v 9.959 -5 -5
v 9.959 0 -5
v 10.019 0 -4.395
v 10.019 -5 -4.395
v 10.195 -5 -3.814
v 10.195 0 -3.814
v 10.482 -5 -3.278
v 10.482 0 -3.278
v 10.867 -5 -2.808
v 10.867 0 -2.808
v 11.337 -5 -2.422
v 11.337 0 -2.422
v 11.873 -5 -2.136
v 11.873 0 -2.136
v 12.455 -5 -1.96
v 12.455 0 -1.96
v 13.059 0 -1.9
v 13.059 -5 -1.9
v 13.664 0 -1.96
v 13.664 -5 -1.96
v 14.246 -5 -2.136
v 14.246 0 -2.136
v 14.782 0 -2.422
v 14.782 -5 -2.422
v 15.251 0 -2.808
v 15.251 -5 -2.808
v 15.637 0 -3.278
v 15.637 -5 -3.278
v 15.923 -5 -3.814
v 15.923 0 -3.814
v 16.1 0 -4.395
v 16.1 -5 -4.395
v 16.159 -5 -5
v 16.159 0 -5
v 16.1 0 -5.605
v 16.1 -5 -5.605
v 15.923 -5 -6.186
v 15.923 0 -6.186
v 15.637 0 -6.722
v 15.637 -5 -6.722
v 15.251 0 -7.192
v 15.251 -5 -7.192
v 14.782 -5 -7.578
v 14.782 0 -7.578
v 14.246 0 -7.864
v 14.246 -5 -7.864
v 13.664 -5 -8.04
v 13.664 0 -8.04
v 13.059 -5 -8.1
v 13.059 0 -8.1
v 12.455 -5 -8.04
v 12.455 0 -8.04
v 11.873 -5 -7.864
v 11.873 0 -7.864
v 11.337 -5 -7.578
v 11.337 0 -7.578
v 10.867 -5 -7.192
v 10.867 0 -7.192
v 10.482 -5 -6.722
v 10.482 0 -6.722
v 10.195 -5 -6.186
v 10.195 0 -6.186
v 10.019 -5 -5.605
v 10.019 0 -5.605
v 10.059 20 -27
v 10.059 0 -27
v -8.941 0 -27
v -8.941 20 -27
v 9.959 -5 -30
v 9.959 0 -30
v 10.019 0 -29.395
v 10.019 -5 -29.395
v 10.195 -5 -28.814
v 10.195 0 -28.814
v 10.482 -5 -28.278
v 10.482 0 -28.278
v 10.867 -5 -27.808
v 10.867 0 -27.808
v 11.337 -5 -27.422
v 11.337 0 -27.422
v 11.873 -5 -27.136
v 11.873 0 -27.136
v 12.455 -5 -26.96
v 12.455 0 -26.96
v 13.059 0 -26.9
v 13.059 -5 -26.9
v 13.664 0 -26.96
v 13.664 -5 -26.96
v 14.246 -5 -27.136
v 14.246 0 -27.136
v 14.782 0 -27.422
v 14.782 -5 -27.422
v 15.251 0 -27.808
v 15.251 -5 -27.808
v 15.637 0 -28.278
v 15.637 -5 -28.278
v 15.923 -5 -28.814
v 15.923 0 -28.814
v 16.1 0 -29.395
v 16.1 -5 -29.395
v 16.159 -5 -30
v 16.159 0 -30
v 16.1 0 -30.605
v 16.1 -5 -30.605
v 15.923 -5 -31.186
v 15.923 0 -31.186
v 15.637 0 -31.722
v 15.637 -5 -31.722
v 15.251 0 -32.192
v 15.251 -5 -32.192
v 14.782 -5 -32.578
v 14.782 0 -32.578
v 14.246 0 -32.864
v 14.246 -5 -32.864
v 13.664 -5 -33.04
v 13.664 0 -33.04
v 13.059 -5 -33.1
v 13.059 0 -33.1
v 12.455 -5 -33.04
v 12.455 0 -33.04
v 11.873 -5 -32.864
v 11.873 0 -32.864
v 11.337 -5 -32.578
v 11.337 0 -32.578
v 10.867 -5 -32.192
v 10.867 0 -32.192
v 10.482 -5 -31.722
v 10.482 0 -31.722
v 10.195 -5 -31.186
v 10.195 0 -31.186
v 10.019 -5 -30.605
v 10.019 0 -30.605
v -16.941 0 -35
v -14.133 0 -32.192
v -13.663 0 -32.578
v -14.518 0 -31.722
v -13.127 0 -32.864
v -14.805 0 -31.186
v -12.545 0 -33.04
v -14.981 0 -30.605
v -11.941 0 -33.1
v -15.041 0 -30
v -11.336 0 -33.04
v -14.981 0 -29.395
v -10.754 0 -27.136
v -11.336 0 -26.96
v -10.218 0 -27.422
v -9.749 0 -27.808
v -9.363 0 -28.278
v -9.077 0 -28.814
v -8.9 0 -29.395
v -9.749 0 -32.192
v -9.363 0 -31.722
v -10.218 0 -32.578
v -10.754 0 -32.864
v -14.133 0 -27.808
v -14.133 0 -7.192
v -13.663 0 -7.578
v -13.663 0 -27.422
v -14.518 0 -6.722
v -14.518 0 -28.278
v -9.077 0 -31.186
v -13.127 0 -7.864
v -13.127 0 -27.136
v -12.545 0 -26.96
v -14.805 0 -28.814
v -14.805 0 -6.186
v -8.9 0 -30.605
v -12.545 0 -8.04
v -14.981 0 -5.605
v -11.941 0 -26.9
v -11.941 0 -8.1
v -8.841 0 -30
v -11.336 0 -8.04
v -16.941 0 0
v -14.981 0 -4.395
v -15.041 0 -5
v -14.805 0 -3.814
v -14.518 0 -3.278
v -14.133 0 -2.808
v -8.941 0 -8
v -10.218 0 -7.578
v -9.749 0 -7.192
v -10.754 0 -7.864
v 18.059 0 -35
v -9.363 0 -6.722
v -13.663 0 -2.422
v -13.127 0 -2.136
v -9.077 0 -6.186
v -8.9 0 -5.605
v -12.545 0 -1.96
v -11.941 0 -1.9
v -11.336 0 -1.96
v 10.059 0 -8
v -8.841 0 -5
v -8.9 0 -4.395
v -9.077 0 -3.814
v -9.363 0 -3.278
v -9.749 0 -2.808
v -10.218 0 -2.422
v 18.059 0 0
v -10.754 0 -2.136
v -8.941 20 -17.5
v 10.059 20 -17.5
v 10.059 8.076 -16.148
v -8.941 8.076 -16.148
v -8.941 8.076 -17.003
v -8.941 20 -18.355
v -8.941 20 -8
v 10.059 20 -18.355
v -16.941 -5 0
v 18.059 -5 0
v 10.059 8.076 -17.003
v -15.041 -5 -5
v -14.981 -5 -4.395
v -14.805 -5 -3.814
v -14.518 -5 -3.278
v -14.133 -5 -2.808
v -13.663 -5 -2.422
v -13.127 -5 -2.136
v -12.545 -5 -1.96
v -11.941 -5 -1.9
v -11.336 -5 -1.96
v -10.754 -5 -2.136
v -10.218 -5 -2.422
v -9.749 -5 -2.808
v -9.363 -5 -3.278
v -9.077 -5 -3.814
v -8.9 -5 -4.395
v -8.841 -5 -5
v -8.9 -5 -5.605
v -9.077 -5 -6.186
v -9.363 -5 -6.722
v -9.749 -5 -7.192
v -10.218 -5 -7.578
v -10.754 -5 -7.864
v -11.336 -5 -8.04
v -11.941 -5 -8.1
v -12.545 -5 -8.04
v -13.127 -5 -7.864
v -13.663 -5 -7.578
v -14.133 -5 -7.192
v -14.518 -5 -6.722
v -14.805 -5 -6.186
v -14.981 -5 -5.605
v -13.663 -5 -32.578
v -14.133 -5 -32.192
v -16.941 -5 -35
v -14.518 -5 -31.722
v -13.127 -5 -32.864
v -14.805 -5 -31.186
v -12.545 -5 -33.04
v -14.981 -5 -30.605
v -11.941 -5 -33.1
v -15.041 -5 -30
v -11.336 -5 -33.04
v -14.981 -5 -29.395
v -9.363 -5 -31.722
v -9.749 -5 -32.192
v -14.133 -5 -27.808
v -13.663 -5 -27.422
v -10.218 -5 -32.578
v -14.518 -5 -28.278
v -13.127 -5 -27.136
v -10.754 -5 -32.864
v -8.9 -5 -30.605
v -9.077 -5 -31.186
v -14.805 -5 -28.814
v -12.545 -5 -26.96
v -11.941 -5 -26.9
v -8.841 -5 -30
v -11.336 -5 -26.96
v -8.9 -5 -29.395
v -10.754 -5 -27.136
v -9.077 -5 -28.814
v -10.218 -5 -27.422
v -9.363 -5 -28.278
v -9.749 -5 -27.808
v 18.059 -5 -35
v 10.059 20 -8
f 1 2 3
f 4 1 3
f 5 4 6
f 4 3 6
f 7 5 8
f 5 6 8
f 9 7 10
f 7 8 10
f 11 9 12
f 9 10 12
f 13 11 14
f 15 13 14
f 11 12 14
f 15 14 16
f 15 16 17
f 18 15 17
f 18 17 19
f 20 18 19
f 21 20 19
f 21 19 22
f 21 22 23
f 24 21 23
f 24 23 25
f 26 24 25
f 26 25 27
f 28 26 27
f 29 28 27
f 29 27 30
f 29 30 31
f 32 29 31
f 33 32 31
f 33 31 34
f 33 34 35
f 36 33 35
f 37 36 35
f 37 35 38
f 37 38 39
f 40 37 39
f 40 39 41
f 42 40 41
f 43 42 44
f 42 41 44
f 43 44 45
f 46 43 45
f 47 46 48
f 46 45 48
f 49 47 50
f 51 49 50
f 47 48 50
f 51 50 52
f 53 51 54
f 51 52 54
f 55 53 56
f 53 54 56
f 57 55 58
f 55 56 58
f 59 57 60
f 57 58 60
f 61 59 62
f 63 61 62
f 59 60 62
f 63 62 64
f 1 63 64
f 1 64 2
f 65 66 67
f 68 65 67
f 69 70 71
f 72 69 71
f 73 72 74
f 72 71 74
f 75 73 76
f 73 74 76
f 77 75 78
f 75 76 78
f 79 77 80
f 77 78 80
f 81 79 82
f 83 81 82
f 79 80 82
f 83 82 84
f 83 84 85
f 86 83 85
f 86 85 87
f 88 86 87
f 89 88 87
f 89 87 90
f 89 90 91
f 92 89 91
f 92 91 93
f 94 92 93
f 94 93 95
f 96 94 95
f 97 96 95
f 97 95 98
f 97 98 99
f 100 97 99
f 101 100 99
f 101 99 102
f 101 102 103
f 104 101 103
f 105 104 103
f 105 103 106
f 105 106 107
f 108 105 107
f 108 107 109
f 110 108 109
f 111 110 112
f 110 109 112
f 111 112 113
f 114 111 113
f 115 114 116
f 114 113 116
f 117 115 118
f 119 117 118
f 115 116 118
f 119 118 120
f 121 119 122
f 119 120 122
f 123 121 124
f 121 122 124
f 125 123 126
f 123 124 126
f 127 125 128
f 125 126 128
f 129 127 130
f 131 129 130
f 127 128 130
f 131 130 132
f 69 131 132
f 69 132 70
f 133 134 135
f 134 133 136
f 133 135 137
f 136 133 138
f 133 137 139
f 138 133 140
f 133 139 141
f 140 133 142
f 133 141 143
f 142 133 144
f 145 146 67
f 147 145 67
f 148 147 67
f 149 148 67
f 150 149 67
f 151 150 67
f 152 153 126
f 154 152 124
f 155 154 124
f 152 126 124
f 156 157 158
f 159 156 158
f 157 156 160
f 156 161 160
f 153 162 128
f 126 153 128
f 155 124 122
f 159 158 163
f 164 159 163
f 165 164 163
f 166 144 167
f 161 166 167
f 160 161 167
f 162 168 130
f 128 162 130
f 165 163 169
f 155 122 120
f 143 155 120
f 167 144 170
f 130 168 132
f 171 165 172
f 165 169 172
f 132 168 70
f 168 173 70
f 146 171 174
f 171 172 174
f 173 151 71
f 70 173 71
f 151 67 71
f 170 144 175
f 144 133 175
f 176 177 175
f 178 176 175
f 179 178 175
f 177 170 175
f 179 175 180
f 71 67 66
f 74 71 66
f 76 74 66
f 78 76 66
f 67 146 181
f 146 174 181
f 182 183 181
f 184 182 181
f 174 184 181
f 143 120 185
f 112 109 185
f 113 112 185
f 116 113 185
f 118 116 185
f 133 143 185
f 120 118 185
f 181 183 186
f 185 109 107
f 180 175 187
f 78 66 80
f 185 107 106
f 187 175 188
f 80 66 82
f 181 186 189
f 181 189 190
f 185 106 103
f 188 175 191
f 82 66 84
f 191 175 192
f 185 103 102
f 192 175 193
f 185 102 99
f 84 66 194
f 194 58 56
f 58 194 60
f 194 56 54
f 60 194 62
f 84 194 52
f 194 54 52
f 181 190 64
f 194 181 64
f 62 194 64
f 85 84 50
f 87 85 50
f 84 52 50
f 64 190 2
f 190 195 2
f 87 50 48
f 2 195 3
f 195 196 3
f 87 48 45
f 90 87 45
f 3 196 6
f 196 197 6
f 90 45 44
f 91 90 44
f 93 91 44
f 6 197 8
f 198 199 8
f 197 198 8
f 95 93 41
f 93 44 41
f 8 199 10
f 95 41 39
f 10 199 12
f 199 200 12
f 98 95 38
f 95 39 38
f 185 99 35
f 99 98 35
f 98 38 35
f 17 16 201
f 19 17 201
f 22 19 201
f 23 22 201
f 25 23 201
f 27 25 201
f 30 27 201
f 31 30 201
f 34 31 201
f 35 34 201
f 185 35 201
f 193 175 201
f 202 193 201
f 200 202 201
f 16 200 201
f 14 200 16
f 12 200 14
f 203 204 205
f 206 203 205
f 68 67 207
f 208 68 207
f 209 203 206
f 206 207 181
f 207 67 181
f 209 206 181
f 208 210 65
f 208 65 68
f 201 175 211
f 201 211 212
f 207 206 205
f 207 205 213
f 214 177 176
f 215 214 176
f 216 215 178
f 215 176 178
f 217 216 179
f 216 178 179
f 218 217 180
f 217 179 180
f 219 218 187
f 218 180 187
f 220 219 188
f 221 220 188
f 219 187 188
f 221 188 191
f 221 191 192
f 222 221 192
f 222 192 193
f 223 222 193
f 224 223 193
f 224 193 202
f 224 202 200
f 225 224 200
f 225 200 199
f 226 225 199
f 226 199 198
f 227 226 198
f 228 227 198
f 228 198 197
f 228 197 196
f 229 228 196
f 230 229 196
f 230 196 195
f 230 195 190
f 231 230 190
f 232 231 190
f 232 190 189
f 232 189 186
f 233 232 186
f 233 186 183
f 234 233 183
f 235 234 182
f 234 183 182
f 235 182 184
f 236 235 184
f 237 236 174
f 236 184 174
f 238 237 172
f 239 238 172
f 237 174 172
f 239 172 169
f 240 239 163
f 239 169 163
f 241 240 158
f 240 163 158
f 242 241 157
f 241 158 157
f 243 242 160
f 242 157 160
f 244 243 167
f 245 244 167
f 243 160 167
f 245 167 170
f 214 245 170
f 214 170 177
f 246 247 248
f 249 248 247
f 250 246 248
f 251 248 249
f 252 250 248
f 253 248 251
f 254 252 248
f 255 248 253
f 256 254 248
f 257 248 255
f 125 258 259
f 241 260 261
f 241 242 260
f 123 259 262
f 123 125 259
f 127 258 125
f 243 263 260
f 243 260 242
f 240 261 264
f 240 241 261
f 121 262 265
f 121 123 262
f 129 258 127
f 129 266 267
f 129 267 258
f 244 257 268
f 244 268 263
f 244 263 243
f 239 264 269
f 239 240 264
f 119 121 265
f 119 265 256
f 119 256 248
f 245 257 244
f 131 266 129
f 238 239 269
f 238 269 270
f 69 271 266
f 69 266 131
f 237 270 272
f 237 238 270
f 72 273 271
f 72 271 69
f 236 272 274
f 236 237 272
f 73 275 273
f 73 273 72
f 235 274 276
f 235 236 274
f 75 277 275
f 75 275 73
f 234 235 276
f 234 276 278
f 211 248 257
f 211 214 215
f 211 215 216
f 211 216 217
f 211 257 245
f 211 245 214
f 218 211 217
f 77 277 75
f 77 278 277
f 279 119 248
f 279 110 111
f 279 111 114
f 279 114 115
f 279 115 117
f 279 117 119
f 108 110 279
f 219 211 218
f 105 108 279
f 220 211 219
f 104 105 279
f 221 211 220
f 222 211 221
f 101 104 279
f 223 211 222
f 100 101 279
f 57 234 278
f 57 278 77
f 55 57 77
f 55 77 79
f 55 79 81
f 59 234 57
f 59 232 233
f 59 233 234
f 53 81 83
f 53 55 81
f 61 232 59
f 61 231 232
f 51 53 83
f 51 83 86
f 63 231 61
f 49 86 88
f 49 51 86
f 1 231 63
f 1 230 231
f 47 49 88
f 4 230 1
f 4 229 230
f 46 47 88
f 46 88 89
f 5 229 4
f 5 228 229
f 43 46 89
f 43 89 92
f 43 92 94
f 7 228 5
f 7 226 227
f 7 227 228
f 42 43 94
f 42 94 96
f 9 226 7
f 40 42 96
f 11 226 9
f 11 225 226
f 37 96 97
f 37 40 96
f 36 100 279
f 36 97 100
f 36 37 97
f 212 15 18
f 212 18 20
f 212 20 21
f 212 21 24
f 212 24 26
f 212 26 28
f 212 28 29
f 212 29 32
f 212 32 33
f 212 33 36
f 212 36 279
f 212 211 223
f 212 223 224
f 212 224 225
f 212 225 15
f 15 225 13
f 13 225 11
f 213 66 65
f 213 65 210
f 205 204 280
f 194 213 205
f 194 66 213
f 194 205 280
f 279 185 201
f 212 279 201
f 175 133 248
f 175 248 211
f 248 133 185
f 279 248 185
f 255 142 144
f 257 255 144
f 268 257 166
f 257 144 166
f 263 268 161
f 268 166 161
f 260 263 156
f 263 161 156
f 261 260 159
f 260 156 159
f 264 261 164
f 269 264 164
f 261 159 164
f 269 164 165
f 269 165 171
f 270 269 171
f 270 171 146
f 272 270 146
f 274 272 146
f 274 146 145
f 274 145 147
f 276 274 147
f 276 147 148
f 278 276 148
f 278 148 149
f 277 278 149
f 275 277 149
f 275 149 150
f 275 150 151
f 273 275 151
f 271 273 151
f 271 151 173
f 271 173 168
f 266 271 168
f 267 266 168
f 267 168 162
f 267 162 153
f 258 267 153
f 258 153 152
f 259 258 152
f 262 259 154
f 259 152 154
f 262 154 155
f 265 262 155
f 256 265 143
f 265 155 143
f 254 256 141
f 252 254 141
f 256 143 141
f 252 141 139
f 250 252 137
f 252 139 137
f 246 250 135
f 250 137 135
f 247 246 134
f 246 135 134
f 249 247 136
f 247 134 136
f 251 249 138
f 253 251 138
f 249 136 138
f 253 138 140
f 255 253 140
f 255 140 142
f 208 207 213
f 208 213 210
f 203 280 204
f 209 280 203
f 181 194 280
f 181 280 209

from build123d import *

# Parameters (mm, degrees)
F0_W     = 35
F0_H     = 35
F1_DEPTH = 5
F2_R     = 3.1
F3_DEPTH = 5.001
F4_W     = 19
F4_H     = 19
F5_DEPTH = 20
F7_DEPTH = 35


with BuildPart() as f1:
    # F0 (on Front) → F1 (new body)
    with BuildSketch(Plane.XZ):
        with Locations((0.559466, -17.5)):
            Rectangle(F0_W, F0_H)
    extrude(amount=F1_DEPTH)

    # F2 (on face) → F3 (cut, through all)
    with BuildSketch(Plane(origin=(0, 0, 0), x_dir=(-1, 0, 0), z_dir=(0, 1, 0))):
        with Locations((-13.059466, -5)):
            Circle(F2_R)
        with Locations((11.940534, -5)):
            Circle(F2_R)
        with Locations((-13.059466, -30)):
            Circle(F2_R)
        with Locations((11.940534, -30)):
            Circle(F2_R)
    extrude(amount=-F3_DEPTH, mode=Mode.SUBTRACT)

    # F4 (on face) → F5 (join)
    with BuildSketch(Plane(origin=(0, 0, 0), x_dir=(-1, 0, 0), z_dir=(0, 1, 0))):
        with Locations((-0.559466, -17.5)):
            Rectangle(F4_W, F4_H)
    extrude(amount=F5_DEPTH)

    # F6 (on face) → F7 (cut)
    with BuildSketch(Plane.YZ.offset(10.059466)):
        Polygon((20, -18.355448), (20, -17.5), (8.076428, -16.147804), (8.076428, -17.003253), align=None)
    extrude(amount=-F7_DEPTH, mode=Mode.SUBTRACT)


solid = f1.part
